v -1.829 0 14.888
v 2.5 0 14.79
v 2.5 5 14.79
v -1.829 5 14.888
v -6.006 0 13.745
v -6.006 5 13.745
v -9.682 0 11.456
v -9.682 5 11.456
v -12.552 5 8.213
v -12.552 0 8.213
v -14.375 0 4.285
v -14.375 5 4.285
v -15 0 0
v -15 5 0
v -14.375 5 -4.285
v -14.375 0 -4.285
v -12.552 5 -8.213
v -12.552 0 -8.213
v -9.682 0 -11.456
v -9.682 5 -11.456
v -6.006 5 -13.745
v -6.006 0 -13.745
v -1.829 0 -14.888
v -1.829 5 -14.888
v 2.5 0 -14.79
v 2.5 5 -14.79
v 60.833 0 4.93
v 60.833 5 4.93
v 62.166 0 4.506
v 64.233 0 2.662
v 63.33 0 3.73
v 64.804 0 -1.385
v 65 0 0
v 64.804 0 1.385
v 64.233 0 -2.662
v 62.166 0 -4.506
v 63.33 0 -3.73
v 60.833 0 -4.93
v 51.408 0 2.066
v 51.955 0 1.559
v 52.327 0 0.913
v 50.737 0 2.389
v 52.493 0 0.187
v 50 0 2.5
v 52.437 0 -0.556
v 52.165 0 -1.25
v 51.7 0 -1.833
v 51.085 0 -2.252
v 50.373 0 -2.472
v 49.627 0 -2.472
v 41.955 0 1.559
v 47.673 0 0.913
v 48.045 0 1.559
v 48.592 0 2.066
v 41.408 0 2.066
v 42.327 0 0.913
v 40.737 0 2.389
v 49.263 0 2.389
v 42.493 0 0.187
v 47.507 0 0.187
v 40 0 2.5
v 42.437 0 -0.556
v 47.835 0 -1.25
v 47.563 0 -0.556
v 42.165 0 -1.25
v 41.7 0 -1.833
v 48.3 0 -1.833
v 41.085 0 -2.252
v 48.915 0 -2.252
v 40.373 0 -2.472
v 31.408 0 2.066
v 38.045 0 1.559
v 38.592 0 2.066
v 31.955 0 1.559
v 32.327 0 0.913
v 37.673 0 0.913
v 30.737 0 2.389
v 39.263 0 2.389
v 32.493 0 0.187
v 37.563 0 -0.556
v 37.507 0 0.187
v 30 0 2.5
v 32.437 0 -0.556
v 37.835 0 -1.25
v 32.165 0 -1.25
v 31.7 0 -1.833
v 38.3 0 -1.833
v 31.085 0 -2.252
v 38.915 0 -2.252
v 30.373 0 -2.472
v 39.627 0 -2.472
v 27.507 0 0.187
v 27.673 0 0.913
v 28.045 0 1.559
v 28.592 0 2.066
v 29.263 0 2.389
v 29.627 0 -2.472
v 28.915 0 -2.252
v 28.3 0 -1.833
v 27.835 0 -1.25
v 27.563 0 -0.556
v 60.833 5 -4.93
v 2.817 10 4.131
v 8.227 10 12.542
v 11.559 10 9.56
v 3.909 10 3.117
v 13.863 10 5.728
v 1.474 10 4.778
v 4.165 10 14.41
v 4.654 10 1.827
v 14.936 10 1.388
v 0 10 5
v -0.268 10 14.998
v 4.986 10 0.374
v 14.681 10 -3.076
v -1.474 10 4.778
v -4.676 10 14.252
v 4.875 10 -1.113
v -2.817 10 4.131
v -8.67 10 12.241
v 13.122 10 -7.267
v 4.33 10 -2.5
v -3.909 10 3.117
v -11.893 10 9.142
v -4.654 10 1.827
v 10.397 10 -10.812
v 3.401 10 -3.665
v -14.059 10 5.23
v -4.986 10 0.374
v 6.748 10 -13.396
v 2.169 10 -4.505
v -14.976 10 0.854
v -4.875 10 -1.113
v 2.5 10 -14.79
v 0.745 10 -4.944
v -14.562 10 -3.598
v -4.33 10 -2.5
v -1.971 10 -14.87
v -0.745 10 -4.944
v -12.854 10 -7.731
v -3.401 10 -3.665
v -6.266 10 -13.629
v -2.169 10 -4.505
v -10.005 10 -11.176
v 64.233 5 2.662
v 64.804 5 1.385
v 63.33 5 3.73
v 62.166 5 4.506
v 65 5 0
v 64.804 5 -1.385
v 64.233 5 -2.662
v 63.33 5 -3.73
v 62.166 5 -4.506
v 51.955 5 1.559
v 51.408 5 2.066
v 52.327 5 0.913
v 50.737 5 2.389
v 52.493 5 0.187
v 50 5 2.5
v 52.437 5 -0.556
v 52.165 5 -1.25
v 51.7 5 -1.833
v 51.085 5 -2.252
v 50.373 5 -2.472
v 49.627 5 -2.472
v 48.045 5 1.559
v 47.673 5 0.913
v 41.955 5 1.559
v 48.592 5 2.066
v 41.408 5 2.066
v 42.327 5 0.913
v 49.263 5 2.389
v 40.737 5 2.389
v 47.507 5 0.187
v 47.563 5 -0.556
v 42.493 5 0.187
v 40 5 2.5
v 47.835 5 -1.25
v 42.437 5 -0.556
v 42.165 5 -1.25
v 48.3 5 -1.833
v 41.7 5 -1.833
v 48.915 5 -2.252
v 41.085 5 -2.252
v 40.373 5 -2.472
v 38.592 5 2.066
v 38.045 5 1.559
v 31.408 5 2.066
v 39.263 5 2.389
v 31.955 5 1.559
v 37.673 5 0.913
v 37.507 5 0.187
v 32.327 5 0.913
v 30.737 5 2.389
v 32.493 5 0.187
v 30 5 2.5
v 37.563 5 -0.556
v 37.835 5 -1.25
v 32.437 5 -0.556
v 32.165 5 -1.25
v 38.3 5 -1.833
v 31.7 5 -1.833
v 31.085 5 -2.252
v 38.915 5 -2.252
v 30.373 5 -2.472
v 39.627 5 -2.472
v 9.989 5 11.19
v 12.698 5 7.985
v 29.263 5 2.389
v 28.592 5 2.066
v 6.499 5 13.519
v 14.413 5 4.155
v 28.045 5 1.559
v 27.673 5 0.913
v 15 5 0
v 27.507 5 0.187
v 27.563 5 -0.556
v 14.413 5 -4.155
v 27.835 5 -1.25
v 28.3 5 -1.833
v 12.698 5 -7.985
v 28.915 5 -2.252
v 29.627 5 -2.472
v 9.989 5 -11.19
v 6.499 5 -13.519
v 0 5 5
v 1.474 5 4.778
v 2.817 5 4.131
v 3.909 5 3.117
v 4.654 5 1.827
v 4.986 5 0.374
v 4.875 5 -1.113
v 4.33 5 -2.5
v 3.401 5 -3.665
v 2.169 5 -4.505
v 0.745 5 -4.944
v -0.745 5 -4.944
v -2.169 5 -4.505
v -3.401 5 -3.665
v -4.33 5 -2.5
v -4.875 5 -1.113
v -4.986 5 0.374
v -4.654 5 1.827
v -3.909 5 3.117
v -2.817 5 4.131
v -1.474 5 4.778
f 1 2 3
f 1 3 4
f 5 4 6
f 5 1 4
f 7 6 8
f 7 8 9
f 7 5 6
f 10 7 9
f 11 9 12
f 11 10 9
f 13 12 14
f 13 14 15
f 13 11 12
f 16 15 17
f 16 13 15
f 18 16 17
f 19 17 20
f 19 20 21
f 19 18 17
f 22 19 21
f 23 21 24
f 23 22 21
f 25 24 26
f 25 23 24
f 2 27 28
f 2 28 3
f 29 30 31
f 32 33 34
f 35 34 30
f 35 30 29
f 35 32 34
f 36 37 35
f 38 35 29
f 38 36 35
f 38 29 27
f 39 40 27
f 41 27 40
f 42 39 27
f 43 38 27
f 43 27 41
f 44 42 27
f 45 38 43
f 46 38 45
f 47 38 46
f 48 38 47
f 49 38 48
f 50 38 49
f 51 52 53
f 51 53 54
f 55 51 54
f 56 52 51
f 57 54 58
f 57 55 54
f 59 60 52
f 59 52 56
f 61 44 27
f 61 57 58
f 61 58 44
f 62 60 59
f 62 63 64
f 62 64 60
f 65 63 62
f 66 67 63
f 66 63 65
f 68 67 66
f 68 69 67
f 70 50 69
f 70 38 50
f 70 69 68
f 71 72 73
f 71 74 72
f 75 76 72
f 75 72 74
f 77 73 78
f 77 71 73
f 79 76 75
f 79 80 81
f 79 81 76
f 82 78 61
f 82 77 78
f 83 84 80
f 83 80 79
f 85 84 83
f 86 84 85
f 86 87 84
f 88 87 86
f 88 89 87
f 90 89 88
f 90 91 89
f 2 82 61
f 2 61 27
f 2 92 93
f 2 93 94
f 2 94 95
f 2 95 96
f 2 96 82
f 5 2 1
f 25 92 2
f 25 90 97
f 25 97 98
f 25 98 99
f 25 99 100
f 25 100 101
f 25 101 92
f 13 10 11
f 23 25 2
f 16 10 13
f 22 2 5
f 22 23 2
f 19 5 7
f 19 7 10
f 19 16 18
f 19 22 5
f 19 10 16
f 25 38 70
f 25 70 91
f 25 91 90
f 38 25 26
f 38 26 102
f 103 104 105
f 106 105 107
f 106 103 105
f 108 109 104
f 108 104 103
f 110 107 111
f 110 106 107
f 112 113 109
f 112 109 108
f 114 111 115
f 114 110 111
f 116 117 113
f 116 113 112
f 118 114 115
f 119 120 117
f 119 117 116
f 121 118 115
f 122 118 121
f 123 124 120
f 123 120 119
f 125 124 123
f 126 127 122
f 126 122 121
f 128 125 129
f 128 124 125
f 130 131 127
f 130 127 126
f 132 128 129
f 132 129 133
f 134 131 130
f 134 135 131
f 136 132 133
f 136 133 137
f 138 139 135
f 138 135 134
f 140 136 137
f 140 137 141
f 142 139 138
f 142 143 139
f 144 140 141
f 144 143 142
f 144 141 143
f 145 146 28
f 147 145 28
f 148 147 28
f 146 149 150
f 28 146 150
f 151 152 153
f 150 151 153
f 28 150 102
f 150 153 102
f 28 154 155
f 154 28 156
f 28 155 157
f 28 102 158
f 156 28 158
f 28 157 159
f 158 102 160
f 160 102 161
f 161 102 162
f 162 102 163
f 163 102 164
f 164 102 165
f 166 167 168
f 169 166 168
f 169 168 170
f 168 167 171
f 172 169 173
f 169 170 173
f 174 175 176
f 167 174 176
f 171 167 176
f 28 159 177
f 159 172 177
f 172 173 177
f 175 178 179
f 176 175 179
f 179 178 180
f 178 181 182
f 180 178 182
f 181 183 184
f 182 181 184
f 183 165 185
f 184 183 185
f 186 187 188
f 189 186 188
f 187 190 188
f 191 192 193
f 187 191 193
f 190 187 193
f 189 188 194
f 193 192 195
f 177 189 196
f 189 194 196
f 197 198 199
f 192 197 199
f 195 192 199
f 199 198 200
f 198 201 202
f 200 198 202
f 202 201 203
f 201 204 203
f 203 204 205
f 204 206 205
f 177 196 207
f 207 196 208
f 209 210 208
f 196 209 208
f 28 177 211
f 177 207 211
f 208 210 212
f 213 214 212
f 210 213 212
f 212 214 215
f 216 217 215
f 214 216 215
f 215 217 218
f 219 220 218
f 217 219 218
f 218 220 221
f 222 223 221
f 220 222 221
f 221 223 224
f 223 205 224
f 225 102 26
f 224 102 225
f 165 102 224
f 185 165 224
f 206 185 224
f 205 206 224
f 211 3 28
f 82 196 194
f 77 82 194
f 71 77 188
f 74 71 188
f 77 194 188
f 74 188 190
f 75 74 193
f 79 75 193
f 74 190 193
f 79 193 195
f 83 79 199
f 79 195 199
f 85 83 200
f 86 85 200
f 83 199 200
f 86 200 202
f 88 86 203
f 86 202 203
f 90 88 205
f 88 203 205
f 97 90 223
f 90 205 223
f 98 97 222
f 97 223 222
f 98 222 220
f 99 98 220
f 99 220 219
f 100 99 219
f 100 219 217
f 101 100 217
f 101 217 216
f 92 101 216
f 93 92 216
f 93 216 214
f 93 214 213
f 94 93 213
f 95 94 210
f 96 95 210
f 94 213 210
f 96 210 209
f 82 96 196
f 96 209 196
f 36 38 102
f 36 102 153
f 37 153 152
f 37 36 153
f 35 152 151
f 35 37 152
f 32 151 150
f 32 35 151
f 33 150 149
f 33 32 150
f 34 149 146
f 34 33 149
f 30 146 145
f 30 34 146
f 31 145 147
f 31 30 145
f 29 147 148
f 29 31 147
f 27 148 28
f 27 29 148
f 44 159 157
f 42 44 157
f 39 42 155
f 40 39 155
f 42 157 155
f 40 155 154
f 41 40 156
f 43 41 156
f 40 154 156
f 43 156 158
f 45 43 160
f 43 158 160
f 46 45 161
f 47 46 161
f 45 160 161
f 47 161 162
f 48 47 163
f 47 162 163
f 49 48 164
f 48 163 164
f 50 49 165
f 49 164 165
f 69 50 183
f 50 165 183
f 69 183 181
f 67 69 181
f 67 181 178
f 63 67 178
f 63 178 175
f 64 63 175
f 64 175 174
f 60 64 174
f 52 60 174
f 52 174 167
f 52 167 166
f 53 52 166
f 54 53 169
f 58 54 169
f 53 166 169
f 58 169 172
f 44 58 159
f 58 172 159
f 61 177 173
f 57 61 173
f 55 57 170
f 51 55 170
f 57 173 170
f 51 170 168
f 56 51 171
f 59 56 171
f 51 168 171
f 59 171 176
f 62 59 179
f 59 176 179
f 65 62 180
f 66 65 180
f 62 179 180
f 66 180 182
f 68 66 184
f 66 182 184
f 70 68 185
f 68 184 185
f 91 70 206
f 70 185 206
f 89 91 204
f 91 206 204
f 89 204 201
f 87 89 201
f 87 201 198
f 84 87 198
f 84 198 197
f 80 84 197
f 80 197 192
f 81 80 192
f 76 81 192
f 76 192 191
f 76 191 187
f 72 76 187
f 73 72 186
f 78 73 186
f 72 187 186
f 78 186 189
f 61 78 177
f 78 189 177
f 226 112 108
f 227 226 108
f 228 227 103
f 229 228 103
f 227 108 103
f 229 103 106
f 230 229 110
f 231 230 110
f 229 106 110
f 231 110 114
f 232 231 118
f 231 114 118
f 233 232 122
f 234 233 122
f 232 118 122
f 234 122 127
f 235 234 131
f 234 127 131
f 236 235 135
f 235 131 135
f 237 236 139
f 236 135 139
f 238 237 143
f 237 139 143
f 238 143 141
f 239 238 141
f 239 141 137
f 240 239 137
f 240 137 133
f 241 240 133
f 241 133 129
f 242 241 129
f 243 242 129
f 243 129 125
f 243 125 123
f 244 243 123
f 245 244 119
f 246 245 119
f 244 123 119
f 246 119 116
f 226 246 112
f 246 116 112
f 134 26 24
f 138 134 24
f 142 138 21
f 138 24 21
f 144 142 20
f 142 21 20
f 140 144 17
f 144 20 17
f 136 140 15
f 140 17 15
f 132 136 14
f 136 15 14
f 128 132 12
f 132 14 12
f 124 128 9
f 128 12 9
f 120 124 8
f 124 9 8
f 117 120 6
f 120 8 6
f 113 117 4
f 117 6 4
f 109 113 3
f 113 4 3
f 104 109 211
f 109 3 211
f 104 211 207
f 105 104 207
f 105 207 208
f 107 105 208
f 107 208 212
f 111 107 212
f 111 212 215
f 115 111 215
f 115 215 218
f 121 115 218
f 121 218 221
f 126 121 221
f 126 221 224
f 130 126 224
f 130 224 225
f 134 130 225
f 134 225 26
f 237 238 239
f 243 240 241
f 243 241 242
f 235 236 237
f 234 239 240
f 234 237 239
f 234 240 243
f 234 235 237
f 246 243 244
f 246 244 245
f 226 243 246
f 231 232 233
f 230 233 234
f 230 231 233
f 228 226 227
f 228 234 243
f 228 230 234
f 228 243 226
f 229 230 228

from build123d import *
from build123d.topology import SkipClean

# Parameters (mm, degrees)
BOSS_EXTRUDE1_DEPTH = 5
SKETCH2_R           = 15
BOSS_EXTRUDE2_DEPTH = 5
SKETCH3_R           = 5
CUT_EXTRUDE1_DEPTH  = 5
SKETCH4_R           = 2.5
CUT_EXTRUDE2_DEPTH  = 5


with BuildPart() as part:
    # Sketch1 → Boss-Extrude1 (new body)
    with BuildSketch(Plane(origin=(0, 0, 0), x_dir=(1, 0, 0), z_dir=(0, 1, 0))):
        with BuildLine():
            Line((2.5, 14.790199458), (60.833333333, 4.930066486))
            ThreePointArc((60.833333333, 4.930066486), (65, 0), (60.833333333, -4.930066486))
            Line((60.833333333, -4.930066486), (2.5, -14.790199458))
            ThreePointArc((2.5, -14.790199458), (-15, 0), (2.5, 14.790199458))
        make_face()
    extrude(amount=BOSS_EXTRUDE1_DEPTH)

    # Sketch2 → Boss-Extrude2 (add)
    with SkipClean():  # the faces are left unmerged after this step: merging them gives an invalid solid
        with BuildSketch(Plane(origin=(0, 5, 0), x_dir=(1, 0, 0), z_dir=(0, 1, 0))):
            with Locations(Location((0, 0, 0), (0, 0, 80.405931773))):
                Circle(SKETCH2_R)
        extrude(amount=BOSS_EXTRUDE2_DEPTH)

    # Sketch3 → Cut-Extrude1 (cut)
    with SkipClean():  # the faces are left unmerged after this step: merging them gives an invalid solid
        with BuildSketch(Plane(origin=(0, 10, 0), x_dir=(1, 0, 0), z_dir=(0, 1, 0))):
            with Locations(Location((0, 0, 0), (0, 0, 270))):
                Circle(SKETCH3_R)
        extrude(amount=-CUT_EXTRUDE1_DEPTH, mode=Mode.SUBTRACT)

    # Sketch4 → Cut-Extrude2 (cut)
    with SkipClean():  # the faces are left unmerged after this step: merging them gives an invalid solid
        with BuildSketch(Plane(origin=(0, 5, 0), x_dir=(1, 0, 0), z_dir=(0, 1, 0))):
            with Locations(Location((50, 0, 0), (0, 0, 270))):
                Circle(SKETCH4_R)
            with Locations(Location((40, 0, 0), (0, 0, 270))):
                Circle(SKETCH4_R)
            with Locations(Location((30, 0, 0), (0, 0, 270))):
                Circle(SKETCH4_R)
        extrude(amount=-CUT_EXTRUDE2_DEPTH, mode=Mode.SUBTRACT)


solid = part.part
